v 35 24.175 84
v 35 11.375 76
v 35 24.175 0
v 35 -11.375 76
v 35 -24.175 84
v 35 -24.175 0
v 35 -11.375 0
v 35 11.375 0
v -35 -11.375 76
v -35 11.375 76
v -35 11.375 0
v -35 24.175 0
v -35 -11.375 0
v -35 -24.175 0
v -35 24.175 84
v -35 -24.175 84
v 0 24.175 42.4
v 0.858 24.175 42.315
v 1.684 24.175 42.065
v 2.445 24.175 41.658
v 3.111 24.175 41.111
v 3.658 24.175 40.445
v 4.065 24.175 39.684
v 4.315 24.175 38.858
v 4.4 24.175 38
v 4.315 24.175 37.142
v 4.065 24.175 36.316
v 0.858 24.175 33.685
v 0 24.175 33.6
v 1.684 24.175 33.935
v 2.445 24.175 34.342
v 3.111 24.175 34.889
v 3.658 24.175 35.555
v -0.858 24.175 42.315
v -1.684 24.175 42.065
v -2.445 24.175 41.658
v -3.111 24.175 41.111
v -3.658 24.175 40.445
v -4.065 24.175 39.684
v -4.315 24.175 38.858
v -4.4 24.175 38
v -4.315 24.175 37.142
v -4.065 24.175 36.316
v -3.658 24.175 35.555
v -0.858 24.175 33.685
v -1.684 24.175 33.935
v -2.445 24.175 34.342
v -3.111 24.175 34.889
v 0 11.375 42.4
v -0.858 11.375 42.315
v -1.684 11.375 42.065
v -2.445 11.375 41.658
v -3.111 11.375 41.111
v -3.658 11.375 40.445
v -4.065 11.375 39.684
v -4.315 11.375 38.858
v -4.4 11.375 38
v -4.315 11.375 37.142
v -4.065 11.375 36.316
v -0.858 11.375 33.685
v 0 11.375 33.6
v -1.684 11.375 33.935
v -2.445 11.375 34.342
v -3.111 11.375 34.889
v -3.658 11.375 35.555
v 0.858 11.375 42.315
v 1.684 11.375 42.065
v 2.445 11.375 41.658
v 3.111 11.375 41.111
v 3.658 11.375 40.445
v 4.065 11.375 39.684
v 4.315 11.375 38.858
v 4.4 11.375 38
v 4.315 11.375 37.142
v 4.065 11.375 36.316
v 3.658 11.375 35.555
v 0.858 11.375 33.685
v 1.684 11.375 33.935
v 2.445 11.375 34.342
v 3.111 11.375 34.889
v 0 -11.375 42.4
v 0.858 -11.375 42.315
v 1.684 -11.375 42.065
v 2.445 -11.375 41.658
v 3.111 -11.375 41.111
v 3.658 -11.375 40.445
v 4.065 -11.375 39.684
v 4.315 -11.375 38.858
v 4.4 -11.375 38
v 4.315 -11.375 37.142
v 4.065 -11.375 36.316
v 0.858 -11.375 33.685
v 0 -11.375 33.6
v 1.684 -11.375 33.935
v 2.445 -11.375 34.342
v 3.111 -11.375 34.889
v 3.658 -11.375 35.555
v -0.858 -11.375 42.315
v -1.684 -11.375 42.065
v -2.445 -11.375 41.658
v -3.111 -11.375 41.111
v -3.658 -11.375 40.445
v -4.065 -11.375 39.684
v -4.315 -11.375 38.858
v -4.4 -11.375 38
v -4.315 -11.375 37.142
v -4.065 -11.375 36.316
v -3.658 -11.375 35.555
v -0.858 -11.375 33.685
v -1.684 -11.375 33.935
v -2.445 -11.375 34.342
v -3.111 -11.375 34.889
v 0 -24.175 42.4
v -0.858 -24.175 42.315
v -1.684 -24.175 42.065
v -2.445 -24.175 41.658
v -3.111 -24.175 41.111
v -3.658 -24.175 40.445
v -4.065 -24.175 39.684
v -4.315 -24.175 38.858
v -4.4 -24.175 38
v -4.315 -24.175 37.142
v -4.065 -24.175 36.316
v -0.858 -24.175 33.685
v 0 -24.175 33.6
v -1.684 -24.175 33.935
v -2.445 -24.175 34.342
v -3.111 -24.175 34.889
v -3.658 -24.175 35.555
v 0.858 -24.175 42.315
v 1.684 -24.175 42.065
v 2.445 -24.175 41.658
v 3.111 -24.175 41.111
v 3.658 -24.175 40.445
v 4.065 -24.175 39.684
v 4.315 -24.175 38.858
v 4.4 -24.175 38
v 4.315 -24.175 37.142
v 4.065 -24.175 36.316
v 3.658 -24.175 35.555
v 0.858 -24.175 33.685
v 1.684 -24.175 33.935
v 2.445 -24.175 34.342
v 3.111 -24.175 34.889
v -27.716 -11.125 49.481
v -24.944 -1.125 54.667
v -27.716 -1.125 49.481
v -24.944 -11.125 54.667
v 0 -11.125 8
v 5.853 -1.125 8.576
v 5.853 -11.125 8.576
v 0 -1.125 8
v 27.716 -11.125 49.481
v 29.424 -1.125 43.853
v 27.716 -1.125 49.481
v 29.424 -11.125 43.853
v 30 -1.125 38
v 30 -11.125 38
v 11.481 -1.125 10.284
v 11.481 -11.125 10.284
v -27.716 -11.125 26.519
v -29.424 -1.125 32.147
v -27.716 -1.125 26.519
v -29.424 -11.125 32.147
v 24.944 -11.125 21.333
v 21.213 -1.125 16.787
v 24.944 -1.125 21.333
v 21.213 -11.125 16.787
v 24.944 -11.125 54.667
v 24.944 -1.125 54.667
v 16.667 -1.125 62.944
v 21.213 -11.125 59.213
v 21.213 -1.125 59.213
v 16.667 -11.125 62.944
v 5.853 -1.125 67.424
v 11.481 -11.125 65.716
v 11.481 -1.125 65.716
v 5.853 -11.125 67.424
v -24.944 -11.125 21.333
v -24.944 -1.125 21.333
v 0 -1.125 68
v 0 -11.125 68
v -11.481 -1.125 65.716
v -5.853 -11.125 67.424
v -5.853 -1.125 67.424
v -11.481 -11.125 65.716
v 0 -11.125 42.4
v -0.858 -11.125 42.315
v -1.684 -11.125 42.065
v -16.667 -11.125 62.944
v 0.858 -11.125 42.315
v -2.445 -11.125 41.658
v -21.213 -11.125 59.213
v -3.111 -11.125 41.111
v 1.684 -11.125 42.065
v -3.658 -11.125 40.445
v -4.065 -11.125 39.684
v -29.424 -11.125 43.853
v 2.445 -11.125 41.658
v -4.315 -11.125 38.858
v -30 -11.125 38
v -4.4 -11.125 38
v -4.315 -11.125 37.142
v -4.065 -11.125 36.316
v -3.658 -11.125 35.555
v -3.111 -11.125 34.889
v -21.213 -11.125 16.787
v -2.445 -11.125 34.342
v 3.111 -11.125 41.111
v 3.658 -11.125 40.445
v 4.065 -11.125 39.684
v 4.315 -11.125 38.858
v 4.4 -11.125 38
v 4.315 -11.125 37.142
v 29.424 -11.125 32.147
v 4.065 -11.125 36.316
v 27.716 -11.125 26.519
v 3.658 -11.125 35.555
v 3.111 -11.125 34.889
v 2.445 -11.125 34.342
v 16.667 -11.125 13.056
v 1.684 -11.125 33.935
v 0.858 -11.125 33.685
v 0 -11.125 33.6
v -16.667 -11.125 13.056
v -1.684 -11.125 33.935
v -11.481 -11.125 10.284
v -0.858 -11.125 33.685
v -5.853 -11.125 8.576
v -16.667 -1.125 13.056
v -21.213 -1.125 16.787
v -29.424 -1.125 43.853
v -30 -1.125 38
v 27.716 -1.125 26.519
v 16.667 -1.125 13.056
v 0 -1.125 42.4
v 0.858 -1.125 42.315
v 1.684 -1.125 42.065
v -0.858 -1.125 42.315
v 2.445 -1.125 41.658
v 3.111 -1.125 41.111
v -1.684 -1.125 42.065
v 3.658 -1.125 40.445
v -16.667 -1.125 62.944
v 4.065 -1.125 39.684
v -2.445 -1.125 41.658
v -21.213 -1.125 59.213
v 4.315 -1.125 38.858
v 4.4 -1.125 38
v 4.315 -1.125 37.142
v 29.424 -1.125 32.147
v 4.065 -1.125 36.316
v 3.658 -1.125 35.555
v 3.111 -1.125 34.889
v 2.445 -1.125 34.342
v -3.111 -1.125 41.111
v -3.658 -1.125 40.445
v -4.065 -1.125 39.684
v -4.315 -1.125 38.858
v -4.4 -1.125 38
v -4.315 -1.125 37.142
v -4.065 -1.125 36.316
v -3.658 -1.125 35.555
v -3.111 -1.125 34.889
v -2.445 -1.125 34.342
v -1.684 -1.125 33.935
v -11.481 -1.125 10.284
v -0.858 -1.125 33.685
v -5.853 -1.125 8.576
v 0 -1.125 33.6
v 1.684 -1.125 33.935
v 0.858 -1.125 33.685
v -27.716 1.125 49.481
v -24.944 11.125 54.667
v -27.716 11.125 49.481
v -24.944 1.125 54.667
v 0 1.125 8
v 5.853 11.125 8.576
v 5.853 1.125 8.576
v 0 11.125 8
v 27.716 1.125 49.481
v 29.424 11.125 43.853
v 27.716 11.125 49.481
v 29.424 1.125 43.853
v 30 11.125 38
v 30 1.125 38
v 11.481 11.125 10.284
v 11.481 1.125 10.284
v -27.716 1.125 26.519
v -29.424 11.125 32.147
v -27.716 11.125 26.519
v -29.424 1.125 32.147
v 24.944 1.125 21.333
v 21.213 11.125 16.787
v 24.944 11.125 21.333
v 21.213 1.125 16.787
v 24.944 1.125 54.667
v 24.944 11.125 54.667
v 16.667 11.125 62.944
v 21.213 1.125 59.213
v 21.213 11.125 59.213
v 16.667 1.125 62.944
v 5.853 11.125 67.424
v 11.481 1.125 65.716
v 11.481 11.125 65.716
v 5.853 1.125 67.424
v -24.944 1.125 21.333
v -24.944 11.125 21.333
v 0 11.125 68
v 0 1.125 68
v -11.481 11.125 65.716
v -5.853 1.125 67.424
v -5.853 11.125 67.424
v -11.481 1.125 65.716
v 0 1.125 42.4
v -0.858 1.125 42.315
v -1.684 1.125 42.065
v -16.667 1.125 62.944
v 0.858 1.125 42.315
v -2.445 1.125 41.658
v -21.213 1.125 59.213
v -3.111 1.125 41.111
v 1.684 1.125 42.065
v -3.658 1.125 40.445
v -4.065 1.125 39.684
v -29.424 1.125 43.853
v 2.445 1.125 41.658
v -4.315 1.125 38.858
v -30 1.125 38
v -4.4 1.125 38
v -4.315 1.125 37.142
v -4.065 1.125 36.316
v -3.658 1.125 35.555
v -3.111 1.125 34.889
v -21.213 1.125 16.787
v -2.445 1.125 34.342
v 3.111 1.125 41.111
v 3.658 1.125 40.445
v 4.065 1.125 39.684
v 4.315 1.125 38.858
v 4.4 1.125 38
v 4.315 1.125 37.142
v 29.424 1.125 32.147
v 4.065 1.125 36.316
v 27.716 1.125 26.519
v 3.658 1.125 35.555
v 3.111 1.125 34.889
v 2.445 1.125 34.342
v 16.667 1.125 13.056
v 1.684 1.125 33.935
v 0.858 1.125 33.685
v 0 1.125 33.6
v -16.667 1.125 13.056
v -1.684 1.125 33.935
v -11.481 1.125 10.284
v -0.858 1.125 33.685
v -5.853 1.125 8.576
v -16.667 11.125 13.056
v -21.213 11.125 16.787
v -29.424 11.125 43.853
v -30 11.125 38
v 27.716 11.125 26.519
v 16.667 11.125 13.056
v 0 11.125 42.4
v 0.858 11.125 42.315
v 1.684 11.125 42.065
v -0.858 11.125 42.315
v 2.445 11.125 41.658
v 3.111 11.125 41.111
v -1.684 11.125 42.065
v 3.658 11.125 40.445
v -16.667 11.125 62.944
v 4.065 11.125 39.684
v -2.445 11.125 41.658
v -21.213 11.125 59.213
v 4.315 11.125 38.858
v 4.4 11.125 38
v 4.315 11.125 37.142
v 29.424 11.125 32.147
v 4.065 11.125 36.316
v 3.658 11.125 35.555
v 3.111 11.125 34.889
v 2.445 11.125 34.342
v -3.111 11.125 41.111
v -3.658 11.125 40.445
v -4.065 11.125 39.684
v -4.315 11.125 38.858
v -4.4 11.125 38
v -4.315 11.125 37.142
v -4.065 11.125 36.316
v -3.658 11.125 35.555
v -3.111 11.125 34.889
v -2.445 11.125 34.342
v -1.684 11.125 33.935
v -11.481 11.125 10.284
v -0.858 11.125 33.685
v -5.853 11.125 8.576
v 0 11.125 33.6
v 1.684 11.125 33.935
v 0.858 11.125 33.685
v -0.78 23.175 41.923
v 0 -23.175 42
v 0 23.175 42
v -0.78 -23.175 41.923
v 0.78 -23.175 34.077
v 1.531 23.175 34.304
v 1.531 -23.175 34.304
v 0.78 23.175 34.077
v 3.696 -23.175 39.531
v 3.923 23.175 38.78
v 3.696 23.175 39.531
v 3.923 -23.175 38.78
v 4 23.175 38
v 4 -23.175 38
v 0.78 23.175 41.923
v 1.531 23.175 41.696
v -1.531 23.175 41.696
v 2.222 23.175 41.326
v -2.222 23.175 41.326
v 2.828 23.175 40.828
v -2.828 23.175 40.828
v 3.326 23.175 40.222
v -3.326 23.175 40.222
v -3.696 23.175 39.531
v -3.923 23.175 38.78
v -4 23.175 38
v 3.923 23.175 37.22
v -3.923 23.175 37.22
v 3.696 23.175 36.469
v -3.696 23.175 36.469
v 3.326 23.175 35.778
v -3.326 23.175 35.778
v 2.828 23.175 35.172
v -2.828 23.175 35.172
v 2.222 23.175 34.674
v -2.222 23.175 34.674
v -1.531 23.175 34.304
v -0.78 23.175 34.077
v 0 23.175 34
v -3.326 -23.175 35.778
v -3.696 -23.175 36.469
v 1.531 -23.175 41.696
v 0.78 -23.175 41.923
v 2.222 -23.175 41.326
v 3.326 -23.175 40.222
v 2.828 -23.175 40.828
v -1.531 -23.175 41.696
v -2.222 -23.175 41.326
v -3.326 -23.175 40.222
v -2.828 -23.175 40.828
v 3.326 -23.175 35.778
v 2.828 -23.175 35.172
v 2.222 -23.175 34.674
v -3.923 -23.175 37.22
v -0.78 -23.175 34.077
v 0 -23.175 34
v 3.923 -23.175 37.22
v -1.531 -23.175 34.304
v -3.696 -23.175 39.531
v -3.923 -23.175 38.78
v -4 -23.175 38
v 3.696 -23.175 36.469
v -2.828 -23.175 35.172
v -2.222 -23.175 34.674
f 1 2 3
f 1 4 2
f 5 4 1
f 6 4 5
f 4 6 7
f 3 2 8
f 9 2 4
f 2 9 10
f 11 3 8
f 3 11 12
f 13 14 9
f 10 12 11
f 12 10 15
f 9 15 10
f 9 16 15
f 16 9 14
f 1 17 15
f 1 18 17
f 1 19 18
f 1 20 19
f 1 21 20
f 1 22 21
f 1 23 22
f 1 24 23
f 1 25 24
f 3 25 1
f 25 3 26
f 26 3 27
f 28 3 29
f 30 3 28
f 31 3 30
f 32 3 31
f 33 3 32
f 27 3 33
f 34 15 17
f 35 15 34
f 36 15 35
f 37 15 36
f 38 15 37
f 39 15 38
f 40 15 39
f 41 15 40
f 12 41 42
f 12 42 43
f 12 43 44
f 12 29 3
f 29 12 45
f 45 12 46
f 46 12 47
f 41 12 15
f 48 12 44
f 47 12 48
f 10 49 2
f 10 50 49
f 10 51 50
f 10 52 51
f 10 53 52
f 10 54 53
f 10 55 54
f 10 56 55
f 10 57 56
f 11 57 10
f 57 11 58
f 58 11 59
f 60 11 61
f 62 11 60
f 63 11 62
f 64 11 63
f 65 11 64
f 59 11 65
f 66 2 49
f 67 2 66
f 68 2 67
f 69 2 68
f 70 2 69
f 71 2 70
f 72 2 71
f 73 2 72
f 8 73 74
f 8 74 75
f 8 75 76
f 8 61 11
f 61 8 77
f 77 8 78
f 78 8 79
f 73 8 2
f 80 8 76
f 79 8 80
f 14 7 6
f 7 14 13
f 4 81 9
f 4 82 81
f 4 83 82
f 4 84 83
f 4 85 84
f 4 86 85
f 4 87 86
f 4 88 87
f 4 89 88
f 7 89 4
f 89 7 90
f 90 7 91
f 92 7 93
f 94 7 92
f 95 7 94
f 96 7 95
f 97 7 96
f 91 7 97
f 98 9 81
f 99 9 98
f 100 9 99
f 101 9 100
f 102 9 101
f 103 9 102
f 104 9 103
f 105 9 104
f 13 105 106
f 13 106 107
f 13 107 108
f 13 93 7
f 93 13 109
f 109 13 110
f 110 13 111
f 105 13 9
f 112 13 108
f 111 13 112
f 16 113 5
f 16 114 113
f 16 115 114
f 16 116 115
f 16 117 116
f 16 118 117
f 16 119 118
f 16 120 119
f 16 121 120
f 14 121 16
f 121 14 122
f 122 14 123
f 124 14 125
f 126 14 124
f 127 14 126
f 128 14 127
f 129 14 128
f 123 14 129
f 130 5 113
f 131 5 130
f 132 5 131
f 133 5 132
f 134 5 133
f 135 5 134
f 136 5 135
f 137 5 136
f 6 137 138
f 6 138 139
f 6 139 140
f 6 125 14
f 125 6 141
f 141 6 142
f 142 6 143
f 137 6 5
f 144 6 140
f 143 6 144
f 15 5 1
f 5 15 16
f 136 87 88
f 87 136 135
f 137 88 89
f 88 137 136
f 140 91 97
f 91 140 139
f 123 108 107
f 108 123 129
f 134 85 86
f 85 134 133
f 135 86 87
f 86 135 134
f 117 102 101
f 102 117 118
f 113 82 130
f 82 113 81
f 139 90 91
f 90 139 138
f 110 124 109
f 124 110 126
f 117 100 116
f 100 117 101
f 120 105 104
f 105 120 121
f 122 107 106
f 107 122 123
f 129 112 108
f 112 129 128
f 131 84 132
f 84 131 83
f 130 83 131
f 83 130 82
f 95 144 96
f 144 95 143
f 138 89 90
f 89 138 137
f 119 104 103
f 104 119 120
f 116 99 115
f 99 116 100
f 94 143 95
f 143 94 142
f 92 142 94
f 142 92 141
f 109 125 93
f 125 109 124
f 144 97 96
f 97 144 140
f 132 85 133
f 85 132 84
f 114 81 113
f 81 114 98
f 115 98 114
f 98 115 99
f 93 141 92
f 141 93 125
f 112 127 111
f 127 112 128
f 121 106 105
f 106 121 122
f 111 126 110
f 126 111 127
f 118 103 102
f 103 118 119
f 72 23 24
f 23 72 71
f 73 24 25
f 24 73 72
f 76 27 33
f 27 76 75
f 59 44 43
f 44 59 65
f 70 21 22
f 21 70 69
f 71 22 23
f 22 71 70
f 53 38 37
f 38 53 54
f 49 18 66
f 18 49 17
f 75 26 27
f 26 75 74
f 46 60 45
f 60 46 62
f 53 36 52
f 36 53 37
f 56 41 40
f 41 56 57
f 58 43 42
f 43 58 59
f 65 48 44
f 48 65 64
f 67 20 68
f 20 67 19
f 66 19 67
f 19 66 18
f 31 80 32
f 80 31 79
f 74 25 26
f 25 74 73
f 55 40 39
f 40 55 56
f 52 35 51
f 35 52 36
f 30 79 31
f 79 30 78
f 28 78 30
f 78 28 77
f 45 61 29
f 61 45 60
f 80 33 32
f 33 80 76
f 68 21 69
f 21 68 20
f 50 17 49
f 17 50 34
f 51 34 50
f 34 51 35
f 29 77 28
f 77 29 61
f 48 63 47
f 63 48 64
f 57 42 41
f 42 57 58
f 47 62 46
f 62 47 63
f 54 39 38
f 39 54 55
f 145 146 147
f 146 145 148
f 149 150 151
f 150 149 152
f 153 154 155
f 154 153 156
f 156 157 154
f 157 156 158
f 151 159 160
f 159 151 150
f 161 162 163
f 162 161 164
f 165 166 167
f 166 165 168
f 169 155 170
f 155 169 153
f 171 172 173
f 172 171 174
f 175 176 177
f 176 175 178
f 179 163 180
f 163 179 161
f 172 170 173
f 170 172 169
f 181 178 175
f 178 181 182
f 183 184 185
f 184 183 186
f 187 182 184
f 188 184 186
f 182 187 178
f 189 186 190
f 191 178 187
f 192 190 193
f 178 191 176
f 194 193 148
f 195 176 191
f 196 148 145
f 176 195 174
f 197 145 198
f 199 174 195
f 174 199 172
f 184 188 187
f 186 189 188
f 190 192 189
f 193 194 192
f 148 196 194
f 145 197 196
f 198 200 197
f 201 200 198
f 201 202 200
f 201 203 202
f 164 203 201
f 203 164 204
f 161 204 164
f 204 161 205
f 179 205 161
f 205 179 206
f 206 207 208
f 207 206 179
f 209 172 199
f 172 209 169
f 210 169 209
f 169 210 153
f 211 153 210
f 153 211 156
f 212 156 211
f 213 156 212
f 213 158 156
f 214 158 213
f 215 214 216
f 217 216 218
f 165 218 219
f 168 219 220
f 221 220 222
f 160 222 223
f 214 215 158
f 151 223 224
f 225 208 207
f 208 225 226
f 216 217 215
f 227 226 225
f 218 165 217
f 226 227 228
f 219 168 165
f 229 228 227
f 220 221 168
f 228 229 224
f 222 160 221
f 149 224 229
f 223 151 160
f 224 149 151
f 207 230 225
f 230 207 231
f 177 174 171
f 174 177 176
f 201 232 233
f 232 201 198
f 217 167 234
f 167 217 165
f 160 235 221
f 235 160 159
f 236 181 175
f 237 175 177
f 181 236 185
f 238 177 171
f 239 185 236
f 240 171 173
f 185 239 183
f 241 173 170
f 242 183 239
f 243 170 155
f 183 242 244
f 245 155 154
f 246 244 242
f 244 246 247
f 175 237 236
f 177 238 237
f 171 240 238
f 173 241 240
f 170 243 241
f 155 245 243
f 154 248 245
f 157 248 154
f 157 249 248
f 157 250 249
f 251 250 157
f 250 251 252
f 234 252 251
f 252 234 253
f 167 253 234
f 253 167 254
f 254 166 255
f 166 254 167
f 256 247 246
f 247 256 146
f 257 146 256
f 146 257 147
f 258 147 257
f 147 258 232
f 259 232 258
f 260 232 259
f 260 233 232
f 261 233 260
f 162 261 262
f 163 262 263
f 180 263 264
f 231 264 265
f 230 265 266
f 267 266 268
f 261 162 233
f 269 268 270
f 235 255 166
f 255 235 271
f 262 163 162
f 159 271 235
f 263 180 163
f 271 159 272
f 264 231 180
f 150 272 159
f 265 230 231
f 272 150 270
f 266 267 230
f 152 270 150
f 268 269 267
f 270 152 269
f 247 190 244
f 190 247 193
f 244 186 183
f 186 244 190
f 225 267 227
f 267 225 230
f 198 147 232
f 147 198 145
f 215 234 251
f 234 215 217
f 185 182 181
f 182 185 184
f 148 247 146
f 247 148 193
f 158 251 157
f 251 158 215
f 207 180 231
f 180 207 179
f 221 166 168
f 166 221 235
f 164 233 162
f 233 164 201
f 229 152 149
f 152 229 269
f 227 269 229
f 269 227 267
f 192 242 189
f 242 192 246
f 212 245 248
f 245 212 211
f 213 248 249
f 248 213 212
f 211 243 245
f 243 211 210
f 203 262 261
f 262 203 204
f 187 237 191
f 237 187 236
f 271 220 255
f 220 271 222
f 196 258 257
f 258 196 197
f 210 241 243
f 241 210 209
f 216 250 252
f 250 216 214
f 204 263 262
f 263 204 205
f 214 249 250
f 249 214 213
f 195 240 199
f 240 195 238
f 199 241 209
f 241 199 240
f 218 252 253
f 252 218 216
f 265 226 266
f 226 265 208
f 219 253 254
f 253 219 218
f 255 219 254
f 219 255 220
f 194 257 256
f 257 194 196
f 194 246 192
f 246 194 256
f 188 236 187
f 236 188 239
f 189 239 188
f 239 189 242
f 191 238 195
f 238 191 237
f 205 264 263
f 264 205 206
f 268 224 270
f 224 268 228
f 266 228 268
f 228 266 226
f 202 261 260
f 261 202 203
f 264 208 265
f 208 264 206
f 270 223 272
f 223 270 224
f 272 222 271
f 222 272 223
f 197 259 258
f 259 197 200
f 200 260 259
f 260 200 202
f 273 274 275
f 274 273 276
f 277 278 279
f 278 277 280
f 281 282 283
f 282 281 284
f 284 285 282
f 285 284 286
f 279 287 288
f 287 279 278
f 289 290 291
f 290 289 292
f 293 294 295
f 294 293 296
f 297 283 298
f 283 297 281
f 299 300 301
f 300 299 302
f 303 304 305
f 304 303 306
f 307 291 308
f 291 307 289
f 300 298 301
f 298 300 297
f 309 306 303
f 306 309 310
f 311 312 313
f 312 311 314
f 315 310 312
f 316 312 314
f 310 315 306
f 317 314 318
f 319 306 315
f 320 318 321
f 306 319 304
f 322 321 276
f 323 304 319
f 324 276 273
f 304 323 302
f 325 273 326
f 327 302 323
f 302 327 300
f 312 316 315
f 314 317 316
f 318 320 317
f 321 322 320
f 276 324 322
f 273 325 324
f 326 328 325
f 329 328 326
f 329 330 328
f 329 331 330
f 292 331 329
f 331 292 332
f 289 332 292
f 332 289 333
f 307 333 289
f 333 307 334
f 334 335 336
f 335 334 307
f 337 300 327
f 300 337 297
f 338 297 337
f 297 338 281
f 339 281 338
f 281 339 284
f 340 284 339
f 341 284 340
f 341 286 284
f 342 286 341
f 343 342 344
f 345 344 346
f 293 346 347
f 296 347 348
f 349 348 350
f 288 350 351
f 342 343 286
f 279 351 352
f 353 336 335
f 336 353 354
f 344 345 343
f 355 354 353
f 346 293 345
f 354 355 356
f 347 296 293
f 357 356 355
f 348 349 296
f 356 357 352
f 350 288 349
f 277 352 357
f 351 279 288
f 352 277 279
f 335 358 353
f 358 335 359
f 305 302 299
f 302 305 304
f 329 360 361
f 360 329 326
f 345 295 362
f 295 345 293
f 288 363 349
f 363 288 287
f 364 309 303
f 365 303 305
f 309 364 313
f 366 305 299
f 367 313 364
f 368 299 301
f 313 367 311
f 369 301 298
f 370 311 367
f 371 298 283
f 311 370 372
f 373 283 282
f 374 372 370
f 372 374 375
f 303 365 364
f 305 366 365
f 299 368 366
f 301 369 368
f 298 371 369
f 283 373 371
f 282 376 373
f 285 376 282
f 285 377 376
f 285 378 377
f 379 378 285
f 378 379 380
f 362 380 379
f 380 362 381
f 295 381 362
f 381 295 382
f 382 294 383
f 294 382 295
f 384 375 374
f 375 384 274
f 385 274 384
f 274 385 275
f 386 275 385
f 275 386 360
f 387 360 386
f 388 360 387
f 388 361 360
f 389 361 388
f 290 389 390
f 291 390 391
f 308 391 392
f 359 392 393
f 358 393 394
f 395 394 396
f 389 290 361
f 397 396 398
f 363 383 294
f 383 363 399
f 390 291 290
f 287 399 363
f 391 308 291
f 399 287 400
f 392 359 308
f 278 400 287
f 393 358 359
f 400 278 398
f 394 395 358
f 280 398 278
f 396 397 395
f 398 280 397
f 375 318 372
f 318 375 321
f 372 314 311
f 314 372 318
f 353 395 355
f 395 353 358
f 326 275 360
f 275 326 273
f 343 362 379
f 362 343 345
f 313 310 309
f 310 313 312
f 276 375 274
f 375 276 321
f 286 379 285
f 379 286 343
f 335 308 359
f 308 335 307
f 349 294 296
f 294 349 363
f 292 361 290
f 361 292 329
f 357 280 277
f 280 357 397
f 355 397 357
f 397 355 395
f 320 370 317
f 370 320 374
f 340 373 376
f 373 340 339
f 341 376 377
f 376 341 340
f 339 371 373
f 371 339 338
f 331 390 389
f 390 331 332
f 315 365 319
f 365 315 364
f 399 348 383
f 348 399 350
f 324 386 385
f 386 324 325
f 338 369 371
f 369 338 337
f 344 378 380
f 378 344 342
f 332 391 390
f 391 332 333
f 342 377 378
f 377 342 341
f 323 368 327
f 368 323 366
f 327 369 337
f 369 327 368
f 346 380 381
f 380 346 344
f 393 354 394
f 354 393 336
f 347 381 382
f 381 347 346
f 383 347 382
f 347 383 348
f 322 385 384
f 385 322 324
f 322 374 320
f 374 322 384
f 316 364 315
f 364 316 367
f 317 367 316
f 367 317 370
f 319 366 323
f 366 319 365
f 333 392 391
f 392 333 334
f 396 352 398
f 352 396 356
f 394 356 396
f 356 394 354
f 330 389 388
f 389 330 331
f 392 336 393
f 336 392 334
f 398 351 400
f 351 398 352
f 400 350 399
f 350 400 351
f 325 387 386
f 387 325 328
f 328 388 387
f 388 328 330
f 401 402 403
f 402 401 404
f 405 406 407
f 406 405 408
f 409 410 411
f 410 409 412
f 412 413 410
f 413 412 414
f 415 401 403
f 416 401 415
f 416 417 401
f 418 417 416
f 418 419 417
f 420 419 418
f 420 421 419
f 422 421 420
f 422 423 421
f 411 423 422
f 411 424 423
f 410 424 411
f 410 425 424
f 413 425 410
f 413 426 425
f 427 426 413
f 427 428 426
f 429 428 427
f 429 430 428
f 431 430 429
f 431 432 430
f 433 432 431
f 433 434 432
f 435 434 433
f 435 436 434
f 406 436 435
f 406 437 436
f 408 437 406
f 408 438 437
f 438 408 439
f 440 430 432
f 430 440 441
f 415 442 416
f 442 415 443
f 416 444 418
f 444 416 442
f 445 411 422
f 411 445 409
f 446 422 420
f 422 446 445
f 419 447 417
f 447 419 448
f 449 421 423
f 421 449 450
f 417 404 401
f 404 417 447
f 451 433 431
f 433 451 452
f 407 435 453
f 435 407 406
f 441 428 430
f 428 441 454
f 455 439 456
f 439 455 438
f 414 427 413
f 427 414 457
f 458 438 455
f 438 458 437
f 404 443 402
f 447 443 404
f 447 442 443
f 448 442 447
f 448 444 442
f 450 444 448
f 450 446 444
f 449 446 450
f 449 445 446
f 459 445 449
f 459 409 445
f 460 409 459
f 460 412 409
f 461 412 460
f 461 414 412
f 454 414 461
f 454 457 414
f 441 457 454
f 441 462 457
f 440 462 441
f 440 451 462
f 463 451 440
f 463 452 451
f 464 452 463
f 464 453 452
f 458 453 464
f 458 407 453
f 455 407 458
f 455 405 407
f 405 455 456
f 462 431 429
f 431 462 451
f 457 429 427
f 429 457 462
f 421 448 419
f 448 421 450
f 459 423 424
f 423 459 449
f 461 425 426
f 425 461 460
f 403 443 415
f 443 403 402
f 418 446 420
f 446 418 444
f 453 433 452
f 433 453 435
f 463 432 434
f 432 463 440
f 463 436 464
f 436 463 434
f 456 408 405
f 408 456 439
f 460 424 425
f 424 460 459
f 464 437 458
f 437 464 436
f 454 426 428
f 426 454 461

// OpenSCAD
$fn = 32;

// ------------------------------------------------------------------------
// Trolley wheel set: wheels d60, fork 76 mm tall
// Every part is its own module, assembly() places every instance.
// ------------------------------------------------------------------------

// --- part 1 ---
module trolley_fork() {
  difference() {
    union() {
      translate([-35, 11.375, 0]) cube([70, 12.8, 76]);
      translate([-35, -24.175, 0]) cube([70, 12.8, 76]);
      translate([-35, -24.175, 76]) cube([70, 48.35, 8]);
    }
    translate([0, -17.775, 38]) rotate([90, 0, 0]) cylinder(h = 14.8, d = 8.8, center = true);
    translate([0, 17.775, 38]) rotate([90, 0, 0]) cylinder(h = 14.8, d = 8.8, center = true);
  }
}

// --- part 2 ---
module trolley_wheel() {
  difference() {
      translate([0, 0, 0]) cylinder(h = 10, d = 60);
      translate([0, 0, -1]) cylinder(h = 12, d = 8.8);
    }
}

// --- part 3 ---
module trolley_axle() {
  translate([0, 0, -23.175]) cylinder(h = 46.35, d = 8);
}

// --- assembly ---
module assembly() {
  color([0.80, 0.24, 0.20]) translate([0, 0, 0]) rotate([0, 0, 0]) trolley_fork();
  color([0.20, 0.45, 0.75]) translate([0, -1.125, 38]) rotate([90, 0, 0]) trolley_wheel();
  color([0.25, 0.62, 0.32]) translate([0, 11.125, 38]) rotate([90, 0, 0]) trolley_wheel();
  color([0.92, 0.70, 0.18]) translate([0, 0, 38]) rotate([90, 0, 0]) trolley_axle();
}

assembly();
